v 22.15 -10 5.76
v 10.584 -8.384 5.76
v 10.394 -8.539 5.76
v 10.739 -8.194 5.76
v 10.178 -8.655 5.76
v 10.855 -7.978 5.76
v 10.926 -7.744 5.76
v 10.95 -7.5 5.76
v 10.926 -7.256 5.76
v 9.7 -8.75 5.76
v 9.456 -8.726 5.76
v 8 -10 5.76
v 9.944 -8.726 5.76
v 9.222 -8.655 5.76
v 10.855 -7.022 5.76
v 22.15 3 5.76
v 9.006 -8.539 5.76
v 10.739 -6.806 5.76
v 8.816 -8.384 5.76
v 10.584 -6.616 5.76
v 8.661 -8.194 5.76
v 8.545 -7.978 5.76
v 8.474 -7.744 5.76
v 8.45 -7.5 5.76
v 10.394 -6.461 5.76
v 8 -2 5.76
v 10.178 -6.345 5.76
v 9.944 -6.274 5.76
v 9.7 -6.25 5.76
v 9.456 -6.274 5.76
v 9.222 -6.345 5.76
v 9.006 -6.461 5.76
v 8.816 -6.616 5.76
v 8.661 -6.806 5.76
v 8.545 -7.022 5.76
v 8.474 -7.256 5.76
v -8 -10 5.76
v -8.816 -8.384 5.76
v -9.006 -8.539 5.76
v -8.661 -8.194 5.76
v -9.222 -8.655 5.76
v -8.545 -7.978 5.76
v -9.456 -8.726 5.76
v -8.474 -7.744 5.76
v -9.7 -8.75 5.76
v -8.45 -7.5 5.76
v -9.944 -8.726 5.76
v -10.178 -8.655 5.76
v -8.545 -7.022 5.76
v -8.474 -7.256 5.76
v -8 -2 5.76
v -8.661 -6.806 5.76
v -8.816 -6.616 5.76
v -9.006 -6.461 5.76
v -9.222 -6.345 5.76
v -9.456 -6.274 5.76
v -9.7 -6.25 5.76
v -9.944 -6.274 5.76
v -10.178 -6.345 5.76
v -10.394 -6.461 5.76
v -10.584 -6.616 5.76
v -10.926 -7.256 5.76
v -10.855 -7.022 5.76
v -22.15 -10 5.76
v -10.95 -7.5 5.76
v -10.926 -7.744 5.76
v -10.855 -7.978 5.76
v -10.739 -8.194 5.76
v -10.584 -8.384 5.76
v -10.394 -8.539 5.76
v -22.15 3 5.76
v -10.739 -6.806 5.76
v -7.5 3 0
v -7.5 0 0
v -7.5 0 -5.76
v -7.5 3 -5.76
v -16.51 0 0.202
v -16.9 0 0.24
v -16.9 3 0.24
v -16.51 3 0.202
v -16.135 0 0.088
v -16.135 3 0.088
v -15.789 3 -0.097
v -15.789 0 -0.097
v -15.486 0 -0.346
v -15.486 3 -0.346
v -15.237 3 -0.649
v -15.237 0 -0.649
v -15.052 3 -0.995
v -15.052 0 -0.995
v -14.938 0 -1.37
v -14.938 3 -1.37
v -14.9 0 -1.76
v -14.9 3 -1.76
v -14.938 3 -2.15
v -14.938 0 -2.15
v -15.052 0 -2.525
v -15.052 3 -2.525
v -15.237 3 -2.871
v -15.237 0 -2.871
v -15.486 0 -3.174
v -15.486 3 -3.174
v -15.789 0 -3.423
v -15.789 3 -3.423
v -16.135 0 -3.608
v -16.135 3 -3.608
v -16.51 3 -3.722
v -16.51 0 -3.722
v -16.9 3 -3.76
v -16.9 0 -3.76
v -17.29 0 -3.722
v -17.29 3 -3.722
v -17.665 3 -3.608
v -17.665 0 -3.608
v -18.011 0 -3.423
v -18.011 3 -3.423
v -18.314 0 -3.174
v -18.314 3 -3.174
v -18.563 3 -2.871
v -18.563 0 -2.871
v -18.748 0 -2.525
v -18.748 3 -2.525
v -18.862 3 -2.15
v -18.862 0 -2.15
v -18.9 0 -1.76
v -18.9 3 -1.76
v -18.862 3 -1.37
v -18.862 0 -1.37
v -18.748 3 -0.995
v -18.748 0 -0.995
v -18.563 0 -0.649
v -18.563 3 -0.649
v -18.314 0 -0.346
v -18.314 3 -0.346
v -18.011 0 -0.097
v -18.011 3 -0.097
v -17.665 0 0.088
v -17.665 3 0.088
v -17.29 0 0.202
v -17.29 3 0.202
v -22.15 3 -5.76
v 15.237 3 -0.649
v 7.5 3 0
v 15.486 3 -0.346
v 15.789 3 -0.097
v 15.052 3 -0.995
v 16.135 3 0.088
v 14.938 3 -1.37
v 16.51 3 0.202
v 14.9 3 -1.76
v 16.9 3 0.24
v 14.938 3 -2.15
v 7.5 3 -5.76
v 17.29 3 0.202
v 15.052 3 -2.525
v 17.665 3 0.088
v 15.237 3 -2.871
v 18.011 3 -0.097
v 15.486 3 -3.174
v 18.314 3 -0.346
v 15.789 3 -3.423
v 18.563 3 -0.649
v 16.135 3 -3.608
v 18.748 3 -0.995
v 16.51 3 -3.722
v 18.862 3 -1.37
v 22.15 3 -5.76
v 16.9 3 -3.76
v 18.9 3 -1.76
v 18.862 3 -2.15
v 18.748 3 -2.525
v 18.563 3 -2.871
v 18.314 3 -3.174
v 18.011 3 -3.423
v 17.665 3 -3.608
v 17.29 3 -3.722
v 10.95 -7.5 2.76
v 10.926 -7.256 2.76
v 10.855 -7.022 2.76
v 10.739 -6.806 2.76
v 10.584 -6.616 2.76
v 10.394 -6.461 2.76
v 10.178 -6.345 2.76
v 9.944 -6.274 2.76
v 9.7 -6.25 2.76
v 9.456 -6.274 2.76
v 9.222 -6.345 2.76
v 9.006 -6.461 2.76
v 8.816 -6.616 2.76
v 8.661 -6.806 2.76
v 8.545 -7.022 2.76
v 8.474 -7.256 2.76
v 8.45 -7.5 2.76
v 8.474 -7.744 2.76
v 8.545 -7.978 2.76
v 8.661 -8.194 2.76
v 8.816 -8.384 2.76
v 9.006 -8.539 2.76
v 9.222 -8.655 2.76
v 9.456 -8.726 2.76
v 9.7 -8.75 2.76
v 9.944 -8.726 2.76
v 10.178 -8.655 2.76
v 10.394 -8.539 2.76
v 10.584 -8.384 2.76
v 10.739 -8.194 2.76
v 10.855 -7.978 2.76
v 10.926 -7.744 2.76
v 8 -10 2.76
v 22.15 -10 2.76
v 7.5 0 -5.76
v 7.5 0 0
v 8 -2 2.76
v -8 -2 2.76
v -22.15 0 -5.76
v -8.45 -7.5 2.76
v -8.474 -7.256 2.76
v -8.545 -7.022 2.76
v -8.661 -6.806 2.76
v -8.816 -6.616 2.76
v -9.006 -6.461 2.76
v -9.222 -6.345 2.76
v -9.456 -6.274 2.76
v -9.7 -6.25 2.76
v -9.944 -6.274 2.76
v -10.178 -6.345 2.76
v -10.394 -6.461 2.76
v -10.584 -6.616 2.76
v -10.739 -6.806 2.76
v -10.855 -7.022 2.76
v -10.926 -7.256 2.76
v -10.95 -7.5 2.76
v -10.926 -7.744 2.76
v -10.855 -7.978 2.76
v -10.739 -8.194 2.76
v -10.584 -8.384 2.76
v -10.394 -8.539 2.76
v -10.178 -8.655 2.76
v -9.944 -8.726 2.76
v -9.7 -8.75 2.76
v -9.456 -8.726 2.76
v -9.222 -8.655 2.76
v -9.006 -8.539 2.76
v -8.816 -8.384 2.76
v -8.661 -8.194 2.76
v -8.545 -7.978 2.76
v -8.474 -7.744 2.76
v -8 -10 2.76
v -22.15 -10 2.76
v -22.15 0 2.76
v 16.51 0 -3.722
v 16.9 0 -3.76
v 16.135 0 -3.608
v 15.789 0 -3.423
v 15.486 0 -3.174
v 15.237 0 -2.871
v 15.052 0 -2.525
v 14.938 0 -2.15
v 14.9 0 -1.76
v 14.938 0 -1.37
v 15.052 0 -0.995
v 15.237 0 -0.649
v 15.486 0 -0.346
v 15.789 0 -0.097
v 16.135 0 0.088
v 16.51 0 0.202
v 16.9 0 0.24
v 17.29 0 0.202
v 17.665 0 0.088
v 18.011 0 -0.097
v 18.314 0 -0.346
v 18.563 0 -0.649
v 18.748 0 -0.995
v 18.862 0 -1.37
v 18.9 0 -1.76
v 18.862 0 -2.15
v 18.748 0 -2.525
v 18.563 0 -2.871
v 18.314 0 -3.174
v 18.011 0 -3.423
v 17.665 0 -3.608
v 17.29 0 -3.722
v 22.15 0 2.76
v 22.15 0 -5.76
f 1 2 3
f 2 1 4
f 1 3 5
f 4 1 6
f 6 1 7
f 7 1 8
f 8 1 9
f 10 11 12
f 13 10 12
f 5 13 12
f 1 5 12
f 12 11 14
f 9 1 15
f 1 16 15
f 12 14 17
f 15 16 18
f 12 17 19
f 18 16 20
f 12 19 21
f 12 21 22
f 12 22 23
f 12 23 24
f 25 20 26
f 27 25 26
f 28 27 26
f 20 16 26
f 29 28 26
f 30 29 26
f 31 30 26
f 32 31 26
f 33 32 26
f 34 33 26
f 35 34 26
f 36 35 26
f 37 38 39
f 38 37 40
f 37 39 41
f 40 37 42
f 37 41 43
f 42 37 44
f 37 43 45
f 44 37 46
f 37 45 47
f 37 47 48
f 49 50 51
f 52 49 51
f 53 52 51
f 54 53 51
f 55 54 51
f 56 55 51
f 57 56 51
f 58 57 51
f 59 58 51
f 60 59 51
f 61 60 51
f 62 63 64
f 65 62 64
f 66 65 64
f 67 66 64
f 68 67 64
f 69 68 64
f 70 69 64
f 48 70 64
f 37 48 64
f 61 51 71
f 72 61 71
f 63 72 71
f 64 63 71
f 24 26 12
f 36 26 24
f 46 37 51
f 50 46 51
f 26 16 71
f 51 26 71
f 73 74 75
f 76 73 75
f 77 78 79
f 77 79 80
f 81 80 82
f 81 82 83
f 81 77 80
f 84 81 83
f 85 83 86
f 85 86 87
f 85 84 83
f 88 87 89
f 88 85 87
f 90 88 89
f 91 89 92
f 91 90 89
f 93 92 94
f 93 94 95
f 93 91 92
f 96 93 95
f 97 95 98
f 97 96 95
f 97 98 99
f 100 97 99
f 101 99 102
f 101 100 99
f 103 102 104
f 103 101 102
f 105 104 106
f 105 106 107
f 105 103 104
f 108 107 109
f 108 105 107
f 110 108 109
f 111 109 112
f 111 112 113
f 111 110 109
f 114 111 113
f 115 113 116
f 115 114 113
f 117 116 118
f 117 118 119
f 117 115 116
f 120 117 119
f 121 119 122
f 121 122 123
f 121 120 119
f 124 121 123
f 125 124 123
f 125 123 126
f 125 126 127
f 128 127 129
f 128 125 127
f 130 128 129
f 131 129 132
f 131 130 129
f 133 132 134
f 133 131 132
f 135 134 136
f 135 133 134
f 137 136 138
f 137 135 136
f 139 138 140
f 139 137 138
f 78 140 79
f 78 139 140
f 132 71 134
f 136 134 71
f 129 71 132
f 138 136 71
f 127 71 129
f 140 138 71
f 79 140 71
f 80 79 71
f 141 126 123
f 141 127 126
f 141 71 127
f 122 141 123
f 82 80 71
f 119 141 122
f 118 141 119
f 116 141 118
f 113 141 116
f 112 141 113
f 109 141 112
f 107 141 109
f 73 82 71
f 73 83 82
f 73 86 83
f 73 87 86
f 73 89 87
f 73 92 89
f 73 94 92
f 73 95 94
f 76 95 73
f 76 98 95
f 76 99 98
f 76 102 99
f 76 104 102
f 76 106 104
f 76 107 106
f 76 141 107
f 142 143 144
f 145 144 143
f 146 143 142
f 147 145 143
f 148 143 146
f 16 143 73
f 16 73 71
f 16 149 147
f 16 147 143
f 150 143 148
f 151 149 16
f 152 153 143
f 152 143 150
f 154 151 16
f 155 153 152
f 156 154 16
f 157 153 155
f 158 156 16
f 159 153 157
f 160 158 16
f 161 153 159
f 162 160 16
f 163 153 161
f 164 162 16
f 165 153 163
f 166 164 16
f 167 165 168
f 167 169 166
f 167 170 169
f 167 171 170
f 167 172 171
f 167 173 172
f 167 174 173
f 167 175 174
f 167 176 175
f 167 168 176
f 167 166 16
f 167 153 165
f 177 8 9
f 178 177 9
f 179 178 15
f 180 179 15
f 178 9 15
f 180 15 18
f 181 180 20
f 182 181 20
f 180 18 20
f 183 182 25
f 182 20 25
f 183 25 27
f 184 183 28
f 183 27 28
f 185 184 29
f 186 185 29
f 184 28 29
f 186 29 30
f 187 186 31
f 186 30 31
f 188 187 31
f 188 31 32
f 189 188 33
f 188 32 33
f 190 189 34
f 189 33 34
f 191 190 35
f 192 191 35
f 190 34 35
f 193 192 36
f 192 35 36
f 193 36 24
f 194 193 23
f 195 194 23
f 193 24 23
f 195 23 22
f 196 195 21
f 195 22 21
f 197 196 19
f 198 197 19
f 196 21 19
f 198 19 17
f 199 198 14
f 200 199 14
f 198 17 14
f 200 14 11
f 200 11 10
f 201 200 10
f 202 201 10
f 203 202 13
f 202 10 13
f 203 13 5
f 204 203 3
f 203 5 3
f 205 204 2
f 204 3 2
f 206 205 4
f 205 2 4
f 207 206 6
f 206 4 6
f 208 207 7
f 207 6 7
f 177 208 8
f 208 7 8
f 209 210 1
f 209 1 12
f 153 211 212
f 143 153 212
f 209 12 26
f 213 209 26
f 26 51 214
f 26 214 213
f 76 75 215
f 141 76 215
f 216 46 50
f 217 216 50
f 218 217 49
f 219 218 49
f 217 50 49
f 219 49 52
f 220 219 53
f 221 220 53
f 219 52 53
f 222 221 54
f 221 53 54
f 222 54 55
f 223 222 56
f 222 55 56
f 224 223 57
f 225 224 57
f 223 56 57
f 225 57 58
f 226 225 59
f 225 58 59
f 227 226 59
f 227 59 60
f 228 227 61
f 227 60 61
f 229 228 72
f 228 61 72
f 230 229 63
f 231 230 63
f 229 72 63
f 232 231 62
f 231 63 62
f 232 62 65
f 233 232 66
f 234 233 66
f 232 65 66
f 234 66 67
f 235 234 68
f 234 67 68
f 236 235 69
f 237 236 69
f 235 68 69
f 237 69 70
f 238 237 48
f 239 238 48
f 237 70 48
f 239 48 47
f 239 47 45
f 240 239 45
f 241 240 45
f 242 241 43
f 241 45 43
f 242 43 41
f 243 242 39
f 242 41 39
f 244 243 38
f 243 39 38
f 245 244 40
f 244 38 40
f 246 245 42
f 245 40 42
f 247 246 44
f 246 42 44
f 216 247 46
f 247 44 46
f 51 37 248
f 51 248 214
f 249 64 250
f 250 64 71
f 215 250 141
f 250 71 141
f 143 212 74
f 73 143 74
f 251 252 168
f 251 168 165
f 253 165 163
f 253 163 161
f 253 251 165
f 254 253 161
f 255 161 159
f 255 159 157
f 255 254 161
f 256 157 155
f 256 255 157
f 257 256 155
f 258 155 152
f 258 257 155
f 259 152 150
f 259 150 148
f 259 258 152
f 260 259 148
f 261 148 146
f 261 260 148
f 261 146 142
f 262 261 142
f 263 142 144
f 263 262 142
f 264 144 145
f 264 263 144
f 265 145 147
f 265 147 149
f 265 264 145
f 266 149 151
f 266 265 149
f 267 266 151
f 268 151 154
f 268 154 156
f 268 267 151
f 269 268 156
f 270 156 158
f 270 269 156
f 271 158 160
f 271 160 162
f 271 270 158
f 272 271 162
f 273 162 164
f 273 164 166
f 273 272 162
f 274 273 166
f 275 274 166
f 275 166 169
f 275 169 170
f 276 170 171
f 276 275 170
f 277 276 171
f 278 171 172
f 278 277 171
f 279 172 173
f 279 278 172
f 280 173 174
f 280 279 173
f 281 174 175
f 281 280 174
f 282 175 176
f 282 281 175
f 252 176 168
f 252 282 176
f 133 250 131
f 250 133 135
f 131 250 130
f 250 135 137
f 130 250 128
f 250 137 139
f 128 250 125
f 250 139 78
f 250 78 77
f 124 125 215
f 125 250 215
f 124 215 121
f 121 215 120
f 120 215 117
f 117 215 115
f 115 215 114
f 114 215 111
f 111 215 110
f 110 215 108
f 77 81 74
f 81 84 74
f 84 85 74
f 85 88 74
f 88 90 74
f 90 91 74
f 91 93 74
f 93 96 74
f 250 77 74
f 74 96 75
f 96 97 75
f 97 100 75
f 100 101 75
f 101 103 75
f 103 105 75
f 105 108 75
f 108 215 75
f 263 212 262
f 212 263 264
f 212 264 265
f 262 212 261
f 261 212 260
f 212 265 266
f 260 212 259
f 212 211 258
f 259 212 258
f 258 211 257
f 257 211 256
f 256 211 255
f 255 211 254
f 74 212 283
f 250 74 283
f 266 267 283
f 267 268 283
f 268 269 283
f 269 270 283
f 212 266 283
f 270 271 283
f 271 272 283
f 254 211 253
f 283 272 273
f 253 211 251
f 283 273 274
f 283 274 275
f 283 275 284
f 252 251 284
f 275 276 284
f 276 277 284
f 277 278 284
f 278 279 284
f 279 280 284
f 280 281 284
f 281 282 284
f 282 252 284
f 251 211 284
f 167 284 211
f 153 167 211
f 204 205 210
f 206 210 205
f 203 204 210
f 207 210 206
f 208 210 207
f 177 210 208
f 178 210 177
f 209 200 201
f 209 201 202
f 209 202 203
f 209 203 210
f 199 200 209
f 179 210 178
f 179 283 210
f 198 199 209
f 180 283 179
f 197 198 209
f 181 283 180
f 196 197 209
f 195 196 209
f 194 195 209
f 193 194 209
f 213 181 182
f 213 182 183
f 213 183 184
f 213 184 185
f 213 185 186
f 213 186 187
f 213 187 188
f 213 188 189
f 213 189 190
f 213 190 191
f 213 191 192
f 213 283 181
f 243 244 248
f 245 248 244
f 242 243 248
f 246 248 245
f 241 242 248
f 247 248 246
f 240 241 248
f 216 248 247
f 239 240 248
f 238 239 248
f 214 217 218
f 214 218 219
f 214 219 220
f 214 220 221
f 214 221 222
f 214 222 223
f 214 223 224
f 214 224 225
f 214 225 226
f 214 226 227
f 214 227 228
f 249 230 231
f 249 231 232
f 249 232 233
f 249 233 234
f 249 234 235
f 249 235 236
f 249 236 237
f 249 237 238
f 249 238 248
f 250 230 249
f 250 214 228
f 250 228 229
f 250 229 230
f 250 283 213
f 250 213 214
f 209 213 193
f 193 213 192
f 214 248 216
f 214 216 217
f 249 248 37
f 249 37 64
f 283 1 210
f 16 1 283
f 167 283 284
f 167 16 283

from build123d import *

# Parameters (mm, degrees)
ESBO_O1_R                = 2
RESSALTO_EXTRUS_O1_DEPTH = 3
ESBO_O2_W                = 44.3
ESBO_O2_H                = 3
RESSALTO_EXTRUS_O2_DEPTH = 10
ESBO_O3_R                = 1.25
ESBO_O3_W                = 16
ESBO_O3_H                = 8
CORTE_EXTRUS_O1_DEPTH    = 3


with BuildPart() as part:
    # Esboço1 → Ressalto-extrusão1 (new body)
    with BuildSketch(Plane(origin=(0, 0, 0), x_dir=(1, 0, 0), z_dir=(0, 1, 0))):
        Polygon((22.15, 5.76), (7.5, 5.76), (7.5, 0), (-7.5, 0), (-7.5, 5.76), (-22.15, 5.76), (-22.15, -5.76), (22.15, -5.76), align=None)
        with Locations(Location((-16.9, 1.76, 0), (0, 0, 270))):
            Circle(ESBO_O1_R, mode=Mode.SUBTRACT)
        with Locations(Location((16.9, 1.76, 0), (0, 0, 90))):
            Circle(ESBO_O1_R, mode=Mode.SUBTRACT)
    extrude(amount=RESSALTO_EXTRUS_O1_DEPTH)

    # Esboço2 → Ressalto-extrusão2 (add)
    with BuildSketch(Plane(origin=(0, 0, 0), x_dir=(-1, 0, 0), z_dir=(0, -1, 0))):
        with Locations((0, -4.26)):
            Rectangle(ESBO_O2_W, ESBO_O2_H)
    extrude(amount=RESSALTO_EXTRUS_O2_DEPTH)

    # Esboço3 → Corte-extrusão1 (cut)
    with BuildSketch(Plane.XY.offset(5.76)):
        with Locations((-9.7, -7.5)):
            Circle(ESBO_O3_R)
        with Locations((9.7, -7.5)):
            Circle(ESBO_O3_R)
        with Locations((0, -6)):
            Rectangle(ESBO_O3_W, ESBO_O3_H)
    extrude(amount=-CORTE_EXTRUS_O1_DEPTH, mode=Mode.SUBTRACT)


solid = part.part
